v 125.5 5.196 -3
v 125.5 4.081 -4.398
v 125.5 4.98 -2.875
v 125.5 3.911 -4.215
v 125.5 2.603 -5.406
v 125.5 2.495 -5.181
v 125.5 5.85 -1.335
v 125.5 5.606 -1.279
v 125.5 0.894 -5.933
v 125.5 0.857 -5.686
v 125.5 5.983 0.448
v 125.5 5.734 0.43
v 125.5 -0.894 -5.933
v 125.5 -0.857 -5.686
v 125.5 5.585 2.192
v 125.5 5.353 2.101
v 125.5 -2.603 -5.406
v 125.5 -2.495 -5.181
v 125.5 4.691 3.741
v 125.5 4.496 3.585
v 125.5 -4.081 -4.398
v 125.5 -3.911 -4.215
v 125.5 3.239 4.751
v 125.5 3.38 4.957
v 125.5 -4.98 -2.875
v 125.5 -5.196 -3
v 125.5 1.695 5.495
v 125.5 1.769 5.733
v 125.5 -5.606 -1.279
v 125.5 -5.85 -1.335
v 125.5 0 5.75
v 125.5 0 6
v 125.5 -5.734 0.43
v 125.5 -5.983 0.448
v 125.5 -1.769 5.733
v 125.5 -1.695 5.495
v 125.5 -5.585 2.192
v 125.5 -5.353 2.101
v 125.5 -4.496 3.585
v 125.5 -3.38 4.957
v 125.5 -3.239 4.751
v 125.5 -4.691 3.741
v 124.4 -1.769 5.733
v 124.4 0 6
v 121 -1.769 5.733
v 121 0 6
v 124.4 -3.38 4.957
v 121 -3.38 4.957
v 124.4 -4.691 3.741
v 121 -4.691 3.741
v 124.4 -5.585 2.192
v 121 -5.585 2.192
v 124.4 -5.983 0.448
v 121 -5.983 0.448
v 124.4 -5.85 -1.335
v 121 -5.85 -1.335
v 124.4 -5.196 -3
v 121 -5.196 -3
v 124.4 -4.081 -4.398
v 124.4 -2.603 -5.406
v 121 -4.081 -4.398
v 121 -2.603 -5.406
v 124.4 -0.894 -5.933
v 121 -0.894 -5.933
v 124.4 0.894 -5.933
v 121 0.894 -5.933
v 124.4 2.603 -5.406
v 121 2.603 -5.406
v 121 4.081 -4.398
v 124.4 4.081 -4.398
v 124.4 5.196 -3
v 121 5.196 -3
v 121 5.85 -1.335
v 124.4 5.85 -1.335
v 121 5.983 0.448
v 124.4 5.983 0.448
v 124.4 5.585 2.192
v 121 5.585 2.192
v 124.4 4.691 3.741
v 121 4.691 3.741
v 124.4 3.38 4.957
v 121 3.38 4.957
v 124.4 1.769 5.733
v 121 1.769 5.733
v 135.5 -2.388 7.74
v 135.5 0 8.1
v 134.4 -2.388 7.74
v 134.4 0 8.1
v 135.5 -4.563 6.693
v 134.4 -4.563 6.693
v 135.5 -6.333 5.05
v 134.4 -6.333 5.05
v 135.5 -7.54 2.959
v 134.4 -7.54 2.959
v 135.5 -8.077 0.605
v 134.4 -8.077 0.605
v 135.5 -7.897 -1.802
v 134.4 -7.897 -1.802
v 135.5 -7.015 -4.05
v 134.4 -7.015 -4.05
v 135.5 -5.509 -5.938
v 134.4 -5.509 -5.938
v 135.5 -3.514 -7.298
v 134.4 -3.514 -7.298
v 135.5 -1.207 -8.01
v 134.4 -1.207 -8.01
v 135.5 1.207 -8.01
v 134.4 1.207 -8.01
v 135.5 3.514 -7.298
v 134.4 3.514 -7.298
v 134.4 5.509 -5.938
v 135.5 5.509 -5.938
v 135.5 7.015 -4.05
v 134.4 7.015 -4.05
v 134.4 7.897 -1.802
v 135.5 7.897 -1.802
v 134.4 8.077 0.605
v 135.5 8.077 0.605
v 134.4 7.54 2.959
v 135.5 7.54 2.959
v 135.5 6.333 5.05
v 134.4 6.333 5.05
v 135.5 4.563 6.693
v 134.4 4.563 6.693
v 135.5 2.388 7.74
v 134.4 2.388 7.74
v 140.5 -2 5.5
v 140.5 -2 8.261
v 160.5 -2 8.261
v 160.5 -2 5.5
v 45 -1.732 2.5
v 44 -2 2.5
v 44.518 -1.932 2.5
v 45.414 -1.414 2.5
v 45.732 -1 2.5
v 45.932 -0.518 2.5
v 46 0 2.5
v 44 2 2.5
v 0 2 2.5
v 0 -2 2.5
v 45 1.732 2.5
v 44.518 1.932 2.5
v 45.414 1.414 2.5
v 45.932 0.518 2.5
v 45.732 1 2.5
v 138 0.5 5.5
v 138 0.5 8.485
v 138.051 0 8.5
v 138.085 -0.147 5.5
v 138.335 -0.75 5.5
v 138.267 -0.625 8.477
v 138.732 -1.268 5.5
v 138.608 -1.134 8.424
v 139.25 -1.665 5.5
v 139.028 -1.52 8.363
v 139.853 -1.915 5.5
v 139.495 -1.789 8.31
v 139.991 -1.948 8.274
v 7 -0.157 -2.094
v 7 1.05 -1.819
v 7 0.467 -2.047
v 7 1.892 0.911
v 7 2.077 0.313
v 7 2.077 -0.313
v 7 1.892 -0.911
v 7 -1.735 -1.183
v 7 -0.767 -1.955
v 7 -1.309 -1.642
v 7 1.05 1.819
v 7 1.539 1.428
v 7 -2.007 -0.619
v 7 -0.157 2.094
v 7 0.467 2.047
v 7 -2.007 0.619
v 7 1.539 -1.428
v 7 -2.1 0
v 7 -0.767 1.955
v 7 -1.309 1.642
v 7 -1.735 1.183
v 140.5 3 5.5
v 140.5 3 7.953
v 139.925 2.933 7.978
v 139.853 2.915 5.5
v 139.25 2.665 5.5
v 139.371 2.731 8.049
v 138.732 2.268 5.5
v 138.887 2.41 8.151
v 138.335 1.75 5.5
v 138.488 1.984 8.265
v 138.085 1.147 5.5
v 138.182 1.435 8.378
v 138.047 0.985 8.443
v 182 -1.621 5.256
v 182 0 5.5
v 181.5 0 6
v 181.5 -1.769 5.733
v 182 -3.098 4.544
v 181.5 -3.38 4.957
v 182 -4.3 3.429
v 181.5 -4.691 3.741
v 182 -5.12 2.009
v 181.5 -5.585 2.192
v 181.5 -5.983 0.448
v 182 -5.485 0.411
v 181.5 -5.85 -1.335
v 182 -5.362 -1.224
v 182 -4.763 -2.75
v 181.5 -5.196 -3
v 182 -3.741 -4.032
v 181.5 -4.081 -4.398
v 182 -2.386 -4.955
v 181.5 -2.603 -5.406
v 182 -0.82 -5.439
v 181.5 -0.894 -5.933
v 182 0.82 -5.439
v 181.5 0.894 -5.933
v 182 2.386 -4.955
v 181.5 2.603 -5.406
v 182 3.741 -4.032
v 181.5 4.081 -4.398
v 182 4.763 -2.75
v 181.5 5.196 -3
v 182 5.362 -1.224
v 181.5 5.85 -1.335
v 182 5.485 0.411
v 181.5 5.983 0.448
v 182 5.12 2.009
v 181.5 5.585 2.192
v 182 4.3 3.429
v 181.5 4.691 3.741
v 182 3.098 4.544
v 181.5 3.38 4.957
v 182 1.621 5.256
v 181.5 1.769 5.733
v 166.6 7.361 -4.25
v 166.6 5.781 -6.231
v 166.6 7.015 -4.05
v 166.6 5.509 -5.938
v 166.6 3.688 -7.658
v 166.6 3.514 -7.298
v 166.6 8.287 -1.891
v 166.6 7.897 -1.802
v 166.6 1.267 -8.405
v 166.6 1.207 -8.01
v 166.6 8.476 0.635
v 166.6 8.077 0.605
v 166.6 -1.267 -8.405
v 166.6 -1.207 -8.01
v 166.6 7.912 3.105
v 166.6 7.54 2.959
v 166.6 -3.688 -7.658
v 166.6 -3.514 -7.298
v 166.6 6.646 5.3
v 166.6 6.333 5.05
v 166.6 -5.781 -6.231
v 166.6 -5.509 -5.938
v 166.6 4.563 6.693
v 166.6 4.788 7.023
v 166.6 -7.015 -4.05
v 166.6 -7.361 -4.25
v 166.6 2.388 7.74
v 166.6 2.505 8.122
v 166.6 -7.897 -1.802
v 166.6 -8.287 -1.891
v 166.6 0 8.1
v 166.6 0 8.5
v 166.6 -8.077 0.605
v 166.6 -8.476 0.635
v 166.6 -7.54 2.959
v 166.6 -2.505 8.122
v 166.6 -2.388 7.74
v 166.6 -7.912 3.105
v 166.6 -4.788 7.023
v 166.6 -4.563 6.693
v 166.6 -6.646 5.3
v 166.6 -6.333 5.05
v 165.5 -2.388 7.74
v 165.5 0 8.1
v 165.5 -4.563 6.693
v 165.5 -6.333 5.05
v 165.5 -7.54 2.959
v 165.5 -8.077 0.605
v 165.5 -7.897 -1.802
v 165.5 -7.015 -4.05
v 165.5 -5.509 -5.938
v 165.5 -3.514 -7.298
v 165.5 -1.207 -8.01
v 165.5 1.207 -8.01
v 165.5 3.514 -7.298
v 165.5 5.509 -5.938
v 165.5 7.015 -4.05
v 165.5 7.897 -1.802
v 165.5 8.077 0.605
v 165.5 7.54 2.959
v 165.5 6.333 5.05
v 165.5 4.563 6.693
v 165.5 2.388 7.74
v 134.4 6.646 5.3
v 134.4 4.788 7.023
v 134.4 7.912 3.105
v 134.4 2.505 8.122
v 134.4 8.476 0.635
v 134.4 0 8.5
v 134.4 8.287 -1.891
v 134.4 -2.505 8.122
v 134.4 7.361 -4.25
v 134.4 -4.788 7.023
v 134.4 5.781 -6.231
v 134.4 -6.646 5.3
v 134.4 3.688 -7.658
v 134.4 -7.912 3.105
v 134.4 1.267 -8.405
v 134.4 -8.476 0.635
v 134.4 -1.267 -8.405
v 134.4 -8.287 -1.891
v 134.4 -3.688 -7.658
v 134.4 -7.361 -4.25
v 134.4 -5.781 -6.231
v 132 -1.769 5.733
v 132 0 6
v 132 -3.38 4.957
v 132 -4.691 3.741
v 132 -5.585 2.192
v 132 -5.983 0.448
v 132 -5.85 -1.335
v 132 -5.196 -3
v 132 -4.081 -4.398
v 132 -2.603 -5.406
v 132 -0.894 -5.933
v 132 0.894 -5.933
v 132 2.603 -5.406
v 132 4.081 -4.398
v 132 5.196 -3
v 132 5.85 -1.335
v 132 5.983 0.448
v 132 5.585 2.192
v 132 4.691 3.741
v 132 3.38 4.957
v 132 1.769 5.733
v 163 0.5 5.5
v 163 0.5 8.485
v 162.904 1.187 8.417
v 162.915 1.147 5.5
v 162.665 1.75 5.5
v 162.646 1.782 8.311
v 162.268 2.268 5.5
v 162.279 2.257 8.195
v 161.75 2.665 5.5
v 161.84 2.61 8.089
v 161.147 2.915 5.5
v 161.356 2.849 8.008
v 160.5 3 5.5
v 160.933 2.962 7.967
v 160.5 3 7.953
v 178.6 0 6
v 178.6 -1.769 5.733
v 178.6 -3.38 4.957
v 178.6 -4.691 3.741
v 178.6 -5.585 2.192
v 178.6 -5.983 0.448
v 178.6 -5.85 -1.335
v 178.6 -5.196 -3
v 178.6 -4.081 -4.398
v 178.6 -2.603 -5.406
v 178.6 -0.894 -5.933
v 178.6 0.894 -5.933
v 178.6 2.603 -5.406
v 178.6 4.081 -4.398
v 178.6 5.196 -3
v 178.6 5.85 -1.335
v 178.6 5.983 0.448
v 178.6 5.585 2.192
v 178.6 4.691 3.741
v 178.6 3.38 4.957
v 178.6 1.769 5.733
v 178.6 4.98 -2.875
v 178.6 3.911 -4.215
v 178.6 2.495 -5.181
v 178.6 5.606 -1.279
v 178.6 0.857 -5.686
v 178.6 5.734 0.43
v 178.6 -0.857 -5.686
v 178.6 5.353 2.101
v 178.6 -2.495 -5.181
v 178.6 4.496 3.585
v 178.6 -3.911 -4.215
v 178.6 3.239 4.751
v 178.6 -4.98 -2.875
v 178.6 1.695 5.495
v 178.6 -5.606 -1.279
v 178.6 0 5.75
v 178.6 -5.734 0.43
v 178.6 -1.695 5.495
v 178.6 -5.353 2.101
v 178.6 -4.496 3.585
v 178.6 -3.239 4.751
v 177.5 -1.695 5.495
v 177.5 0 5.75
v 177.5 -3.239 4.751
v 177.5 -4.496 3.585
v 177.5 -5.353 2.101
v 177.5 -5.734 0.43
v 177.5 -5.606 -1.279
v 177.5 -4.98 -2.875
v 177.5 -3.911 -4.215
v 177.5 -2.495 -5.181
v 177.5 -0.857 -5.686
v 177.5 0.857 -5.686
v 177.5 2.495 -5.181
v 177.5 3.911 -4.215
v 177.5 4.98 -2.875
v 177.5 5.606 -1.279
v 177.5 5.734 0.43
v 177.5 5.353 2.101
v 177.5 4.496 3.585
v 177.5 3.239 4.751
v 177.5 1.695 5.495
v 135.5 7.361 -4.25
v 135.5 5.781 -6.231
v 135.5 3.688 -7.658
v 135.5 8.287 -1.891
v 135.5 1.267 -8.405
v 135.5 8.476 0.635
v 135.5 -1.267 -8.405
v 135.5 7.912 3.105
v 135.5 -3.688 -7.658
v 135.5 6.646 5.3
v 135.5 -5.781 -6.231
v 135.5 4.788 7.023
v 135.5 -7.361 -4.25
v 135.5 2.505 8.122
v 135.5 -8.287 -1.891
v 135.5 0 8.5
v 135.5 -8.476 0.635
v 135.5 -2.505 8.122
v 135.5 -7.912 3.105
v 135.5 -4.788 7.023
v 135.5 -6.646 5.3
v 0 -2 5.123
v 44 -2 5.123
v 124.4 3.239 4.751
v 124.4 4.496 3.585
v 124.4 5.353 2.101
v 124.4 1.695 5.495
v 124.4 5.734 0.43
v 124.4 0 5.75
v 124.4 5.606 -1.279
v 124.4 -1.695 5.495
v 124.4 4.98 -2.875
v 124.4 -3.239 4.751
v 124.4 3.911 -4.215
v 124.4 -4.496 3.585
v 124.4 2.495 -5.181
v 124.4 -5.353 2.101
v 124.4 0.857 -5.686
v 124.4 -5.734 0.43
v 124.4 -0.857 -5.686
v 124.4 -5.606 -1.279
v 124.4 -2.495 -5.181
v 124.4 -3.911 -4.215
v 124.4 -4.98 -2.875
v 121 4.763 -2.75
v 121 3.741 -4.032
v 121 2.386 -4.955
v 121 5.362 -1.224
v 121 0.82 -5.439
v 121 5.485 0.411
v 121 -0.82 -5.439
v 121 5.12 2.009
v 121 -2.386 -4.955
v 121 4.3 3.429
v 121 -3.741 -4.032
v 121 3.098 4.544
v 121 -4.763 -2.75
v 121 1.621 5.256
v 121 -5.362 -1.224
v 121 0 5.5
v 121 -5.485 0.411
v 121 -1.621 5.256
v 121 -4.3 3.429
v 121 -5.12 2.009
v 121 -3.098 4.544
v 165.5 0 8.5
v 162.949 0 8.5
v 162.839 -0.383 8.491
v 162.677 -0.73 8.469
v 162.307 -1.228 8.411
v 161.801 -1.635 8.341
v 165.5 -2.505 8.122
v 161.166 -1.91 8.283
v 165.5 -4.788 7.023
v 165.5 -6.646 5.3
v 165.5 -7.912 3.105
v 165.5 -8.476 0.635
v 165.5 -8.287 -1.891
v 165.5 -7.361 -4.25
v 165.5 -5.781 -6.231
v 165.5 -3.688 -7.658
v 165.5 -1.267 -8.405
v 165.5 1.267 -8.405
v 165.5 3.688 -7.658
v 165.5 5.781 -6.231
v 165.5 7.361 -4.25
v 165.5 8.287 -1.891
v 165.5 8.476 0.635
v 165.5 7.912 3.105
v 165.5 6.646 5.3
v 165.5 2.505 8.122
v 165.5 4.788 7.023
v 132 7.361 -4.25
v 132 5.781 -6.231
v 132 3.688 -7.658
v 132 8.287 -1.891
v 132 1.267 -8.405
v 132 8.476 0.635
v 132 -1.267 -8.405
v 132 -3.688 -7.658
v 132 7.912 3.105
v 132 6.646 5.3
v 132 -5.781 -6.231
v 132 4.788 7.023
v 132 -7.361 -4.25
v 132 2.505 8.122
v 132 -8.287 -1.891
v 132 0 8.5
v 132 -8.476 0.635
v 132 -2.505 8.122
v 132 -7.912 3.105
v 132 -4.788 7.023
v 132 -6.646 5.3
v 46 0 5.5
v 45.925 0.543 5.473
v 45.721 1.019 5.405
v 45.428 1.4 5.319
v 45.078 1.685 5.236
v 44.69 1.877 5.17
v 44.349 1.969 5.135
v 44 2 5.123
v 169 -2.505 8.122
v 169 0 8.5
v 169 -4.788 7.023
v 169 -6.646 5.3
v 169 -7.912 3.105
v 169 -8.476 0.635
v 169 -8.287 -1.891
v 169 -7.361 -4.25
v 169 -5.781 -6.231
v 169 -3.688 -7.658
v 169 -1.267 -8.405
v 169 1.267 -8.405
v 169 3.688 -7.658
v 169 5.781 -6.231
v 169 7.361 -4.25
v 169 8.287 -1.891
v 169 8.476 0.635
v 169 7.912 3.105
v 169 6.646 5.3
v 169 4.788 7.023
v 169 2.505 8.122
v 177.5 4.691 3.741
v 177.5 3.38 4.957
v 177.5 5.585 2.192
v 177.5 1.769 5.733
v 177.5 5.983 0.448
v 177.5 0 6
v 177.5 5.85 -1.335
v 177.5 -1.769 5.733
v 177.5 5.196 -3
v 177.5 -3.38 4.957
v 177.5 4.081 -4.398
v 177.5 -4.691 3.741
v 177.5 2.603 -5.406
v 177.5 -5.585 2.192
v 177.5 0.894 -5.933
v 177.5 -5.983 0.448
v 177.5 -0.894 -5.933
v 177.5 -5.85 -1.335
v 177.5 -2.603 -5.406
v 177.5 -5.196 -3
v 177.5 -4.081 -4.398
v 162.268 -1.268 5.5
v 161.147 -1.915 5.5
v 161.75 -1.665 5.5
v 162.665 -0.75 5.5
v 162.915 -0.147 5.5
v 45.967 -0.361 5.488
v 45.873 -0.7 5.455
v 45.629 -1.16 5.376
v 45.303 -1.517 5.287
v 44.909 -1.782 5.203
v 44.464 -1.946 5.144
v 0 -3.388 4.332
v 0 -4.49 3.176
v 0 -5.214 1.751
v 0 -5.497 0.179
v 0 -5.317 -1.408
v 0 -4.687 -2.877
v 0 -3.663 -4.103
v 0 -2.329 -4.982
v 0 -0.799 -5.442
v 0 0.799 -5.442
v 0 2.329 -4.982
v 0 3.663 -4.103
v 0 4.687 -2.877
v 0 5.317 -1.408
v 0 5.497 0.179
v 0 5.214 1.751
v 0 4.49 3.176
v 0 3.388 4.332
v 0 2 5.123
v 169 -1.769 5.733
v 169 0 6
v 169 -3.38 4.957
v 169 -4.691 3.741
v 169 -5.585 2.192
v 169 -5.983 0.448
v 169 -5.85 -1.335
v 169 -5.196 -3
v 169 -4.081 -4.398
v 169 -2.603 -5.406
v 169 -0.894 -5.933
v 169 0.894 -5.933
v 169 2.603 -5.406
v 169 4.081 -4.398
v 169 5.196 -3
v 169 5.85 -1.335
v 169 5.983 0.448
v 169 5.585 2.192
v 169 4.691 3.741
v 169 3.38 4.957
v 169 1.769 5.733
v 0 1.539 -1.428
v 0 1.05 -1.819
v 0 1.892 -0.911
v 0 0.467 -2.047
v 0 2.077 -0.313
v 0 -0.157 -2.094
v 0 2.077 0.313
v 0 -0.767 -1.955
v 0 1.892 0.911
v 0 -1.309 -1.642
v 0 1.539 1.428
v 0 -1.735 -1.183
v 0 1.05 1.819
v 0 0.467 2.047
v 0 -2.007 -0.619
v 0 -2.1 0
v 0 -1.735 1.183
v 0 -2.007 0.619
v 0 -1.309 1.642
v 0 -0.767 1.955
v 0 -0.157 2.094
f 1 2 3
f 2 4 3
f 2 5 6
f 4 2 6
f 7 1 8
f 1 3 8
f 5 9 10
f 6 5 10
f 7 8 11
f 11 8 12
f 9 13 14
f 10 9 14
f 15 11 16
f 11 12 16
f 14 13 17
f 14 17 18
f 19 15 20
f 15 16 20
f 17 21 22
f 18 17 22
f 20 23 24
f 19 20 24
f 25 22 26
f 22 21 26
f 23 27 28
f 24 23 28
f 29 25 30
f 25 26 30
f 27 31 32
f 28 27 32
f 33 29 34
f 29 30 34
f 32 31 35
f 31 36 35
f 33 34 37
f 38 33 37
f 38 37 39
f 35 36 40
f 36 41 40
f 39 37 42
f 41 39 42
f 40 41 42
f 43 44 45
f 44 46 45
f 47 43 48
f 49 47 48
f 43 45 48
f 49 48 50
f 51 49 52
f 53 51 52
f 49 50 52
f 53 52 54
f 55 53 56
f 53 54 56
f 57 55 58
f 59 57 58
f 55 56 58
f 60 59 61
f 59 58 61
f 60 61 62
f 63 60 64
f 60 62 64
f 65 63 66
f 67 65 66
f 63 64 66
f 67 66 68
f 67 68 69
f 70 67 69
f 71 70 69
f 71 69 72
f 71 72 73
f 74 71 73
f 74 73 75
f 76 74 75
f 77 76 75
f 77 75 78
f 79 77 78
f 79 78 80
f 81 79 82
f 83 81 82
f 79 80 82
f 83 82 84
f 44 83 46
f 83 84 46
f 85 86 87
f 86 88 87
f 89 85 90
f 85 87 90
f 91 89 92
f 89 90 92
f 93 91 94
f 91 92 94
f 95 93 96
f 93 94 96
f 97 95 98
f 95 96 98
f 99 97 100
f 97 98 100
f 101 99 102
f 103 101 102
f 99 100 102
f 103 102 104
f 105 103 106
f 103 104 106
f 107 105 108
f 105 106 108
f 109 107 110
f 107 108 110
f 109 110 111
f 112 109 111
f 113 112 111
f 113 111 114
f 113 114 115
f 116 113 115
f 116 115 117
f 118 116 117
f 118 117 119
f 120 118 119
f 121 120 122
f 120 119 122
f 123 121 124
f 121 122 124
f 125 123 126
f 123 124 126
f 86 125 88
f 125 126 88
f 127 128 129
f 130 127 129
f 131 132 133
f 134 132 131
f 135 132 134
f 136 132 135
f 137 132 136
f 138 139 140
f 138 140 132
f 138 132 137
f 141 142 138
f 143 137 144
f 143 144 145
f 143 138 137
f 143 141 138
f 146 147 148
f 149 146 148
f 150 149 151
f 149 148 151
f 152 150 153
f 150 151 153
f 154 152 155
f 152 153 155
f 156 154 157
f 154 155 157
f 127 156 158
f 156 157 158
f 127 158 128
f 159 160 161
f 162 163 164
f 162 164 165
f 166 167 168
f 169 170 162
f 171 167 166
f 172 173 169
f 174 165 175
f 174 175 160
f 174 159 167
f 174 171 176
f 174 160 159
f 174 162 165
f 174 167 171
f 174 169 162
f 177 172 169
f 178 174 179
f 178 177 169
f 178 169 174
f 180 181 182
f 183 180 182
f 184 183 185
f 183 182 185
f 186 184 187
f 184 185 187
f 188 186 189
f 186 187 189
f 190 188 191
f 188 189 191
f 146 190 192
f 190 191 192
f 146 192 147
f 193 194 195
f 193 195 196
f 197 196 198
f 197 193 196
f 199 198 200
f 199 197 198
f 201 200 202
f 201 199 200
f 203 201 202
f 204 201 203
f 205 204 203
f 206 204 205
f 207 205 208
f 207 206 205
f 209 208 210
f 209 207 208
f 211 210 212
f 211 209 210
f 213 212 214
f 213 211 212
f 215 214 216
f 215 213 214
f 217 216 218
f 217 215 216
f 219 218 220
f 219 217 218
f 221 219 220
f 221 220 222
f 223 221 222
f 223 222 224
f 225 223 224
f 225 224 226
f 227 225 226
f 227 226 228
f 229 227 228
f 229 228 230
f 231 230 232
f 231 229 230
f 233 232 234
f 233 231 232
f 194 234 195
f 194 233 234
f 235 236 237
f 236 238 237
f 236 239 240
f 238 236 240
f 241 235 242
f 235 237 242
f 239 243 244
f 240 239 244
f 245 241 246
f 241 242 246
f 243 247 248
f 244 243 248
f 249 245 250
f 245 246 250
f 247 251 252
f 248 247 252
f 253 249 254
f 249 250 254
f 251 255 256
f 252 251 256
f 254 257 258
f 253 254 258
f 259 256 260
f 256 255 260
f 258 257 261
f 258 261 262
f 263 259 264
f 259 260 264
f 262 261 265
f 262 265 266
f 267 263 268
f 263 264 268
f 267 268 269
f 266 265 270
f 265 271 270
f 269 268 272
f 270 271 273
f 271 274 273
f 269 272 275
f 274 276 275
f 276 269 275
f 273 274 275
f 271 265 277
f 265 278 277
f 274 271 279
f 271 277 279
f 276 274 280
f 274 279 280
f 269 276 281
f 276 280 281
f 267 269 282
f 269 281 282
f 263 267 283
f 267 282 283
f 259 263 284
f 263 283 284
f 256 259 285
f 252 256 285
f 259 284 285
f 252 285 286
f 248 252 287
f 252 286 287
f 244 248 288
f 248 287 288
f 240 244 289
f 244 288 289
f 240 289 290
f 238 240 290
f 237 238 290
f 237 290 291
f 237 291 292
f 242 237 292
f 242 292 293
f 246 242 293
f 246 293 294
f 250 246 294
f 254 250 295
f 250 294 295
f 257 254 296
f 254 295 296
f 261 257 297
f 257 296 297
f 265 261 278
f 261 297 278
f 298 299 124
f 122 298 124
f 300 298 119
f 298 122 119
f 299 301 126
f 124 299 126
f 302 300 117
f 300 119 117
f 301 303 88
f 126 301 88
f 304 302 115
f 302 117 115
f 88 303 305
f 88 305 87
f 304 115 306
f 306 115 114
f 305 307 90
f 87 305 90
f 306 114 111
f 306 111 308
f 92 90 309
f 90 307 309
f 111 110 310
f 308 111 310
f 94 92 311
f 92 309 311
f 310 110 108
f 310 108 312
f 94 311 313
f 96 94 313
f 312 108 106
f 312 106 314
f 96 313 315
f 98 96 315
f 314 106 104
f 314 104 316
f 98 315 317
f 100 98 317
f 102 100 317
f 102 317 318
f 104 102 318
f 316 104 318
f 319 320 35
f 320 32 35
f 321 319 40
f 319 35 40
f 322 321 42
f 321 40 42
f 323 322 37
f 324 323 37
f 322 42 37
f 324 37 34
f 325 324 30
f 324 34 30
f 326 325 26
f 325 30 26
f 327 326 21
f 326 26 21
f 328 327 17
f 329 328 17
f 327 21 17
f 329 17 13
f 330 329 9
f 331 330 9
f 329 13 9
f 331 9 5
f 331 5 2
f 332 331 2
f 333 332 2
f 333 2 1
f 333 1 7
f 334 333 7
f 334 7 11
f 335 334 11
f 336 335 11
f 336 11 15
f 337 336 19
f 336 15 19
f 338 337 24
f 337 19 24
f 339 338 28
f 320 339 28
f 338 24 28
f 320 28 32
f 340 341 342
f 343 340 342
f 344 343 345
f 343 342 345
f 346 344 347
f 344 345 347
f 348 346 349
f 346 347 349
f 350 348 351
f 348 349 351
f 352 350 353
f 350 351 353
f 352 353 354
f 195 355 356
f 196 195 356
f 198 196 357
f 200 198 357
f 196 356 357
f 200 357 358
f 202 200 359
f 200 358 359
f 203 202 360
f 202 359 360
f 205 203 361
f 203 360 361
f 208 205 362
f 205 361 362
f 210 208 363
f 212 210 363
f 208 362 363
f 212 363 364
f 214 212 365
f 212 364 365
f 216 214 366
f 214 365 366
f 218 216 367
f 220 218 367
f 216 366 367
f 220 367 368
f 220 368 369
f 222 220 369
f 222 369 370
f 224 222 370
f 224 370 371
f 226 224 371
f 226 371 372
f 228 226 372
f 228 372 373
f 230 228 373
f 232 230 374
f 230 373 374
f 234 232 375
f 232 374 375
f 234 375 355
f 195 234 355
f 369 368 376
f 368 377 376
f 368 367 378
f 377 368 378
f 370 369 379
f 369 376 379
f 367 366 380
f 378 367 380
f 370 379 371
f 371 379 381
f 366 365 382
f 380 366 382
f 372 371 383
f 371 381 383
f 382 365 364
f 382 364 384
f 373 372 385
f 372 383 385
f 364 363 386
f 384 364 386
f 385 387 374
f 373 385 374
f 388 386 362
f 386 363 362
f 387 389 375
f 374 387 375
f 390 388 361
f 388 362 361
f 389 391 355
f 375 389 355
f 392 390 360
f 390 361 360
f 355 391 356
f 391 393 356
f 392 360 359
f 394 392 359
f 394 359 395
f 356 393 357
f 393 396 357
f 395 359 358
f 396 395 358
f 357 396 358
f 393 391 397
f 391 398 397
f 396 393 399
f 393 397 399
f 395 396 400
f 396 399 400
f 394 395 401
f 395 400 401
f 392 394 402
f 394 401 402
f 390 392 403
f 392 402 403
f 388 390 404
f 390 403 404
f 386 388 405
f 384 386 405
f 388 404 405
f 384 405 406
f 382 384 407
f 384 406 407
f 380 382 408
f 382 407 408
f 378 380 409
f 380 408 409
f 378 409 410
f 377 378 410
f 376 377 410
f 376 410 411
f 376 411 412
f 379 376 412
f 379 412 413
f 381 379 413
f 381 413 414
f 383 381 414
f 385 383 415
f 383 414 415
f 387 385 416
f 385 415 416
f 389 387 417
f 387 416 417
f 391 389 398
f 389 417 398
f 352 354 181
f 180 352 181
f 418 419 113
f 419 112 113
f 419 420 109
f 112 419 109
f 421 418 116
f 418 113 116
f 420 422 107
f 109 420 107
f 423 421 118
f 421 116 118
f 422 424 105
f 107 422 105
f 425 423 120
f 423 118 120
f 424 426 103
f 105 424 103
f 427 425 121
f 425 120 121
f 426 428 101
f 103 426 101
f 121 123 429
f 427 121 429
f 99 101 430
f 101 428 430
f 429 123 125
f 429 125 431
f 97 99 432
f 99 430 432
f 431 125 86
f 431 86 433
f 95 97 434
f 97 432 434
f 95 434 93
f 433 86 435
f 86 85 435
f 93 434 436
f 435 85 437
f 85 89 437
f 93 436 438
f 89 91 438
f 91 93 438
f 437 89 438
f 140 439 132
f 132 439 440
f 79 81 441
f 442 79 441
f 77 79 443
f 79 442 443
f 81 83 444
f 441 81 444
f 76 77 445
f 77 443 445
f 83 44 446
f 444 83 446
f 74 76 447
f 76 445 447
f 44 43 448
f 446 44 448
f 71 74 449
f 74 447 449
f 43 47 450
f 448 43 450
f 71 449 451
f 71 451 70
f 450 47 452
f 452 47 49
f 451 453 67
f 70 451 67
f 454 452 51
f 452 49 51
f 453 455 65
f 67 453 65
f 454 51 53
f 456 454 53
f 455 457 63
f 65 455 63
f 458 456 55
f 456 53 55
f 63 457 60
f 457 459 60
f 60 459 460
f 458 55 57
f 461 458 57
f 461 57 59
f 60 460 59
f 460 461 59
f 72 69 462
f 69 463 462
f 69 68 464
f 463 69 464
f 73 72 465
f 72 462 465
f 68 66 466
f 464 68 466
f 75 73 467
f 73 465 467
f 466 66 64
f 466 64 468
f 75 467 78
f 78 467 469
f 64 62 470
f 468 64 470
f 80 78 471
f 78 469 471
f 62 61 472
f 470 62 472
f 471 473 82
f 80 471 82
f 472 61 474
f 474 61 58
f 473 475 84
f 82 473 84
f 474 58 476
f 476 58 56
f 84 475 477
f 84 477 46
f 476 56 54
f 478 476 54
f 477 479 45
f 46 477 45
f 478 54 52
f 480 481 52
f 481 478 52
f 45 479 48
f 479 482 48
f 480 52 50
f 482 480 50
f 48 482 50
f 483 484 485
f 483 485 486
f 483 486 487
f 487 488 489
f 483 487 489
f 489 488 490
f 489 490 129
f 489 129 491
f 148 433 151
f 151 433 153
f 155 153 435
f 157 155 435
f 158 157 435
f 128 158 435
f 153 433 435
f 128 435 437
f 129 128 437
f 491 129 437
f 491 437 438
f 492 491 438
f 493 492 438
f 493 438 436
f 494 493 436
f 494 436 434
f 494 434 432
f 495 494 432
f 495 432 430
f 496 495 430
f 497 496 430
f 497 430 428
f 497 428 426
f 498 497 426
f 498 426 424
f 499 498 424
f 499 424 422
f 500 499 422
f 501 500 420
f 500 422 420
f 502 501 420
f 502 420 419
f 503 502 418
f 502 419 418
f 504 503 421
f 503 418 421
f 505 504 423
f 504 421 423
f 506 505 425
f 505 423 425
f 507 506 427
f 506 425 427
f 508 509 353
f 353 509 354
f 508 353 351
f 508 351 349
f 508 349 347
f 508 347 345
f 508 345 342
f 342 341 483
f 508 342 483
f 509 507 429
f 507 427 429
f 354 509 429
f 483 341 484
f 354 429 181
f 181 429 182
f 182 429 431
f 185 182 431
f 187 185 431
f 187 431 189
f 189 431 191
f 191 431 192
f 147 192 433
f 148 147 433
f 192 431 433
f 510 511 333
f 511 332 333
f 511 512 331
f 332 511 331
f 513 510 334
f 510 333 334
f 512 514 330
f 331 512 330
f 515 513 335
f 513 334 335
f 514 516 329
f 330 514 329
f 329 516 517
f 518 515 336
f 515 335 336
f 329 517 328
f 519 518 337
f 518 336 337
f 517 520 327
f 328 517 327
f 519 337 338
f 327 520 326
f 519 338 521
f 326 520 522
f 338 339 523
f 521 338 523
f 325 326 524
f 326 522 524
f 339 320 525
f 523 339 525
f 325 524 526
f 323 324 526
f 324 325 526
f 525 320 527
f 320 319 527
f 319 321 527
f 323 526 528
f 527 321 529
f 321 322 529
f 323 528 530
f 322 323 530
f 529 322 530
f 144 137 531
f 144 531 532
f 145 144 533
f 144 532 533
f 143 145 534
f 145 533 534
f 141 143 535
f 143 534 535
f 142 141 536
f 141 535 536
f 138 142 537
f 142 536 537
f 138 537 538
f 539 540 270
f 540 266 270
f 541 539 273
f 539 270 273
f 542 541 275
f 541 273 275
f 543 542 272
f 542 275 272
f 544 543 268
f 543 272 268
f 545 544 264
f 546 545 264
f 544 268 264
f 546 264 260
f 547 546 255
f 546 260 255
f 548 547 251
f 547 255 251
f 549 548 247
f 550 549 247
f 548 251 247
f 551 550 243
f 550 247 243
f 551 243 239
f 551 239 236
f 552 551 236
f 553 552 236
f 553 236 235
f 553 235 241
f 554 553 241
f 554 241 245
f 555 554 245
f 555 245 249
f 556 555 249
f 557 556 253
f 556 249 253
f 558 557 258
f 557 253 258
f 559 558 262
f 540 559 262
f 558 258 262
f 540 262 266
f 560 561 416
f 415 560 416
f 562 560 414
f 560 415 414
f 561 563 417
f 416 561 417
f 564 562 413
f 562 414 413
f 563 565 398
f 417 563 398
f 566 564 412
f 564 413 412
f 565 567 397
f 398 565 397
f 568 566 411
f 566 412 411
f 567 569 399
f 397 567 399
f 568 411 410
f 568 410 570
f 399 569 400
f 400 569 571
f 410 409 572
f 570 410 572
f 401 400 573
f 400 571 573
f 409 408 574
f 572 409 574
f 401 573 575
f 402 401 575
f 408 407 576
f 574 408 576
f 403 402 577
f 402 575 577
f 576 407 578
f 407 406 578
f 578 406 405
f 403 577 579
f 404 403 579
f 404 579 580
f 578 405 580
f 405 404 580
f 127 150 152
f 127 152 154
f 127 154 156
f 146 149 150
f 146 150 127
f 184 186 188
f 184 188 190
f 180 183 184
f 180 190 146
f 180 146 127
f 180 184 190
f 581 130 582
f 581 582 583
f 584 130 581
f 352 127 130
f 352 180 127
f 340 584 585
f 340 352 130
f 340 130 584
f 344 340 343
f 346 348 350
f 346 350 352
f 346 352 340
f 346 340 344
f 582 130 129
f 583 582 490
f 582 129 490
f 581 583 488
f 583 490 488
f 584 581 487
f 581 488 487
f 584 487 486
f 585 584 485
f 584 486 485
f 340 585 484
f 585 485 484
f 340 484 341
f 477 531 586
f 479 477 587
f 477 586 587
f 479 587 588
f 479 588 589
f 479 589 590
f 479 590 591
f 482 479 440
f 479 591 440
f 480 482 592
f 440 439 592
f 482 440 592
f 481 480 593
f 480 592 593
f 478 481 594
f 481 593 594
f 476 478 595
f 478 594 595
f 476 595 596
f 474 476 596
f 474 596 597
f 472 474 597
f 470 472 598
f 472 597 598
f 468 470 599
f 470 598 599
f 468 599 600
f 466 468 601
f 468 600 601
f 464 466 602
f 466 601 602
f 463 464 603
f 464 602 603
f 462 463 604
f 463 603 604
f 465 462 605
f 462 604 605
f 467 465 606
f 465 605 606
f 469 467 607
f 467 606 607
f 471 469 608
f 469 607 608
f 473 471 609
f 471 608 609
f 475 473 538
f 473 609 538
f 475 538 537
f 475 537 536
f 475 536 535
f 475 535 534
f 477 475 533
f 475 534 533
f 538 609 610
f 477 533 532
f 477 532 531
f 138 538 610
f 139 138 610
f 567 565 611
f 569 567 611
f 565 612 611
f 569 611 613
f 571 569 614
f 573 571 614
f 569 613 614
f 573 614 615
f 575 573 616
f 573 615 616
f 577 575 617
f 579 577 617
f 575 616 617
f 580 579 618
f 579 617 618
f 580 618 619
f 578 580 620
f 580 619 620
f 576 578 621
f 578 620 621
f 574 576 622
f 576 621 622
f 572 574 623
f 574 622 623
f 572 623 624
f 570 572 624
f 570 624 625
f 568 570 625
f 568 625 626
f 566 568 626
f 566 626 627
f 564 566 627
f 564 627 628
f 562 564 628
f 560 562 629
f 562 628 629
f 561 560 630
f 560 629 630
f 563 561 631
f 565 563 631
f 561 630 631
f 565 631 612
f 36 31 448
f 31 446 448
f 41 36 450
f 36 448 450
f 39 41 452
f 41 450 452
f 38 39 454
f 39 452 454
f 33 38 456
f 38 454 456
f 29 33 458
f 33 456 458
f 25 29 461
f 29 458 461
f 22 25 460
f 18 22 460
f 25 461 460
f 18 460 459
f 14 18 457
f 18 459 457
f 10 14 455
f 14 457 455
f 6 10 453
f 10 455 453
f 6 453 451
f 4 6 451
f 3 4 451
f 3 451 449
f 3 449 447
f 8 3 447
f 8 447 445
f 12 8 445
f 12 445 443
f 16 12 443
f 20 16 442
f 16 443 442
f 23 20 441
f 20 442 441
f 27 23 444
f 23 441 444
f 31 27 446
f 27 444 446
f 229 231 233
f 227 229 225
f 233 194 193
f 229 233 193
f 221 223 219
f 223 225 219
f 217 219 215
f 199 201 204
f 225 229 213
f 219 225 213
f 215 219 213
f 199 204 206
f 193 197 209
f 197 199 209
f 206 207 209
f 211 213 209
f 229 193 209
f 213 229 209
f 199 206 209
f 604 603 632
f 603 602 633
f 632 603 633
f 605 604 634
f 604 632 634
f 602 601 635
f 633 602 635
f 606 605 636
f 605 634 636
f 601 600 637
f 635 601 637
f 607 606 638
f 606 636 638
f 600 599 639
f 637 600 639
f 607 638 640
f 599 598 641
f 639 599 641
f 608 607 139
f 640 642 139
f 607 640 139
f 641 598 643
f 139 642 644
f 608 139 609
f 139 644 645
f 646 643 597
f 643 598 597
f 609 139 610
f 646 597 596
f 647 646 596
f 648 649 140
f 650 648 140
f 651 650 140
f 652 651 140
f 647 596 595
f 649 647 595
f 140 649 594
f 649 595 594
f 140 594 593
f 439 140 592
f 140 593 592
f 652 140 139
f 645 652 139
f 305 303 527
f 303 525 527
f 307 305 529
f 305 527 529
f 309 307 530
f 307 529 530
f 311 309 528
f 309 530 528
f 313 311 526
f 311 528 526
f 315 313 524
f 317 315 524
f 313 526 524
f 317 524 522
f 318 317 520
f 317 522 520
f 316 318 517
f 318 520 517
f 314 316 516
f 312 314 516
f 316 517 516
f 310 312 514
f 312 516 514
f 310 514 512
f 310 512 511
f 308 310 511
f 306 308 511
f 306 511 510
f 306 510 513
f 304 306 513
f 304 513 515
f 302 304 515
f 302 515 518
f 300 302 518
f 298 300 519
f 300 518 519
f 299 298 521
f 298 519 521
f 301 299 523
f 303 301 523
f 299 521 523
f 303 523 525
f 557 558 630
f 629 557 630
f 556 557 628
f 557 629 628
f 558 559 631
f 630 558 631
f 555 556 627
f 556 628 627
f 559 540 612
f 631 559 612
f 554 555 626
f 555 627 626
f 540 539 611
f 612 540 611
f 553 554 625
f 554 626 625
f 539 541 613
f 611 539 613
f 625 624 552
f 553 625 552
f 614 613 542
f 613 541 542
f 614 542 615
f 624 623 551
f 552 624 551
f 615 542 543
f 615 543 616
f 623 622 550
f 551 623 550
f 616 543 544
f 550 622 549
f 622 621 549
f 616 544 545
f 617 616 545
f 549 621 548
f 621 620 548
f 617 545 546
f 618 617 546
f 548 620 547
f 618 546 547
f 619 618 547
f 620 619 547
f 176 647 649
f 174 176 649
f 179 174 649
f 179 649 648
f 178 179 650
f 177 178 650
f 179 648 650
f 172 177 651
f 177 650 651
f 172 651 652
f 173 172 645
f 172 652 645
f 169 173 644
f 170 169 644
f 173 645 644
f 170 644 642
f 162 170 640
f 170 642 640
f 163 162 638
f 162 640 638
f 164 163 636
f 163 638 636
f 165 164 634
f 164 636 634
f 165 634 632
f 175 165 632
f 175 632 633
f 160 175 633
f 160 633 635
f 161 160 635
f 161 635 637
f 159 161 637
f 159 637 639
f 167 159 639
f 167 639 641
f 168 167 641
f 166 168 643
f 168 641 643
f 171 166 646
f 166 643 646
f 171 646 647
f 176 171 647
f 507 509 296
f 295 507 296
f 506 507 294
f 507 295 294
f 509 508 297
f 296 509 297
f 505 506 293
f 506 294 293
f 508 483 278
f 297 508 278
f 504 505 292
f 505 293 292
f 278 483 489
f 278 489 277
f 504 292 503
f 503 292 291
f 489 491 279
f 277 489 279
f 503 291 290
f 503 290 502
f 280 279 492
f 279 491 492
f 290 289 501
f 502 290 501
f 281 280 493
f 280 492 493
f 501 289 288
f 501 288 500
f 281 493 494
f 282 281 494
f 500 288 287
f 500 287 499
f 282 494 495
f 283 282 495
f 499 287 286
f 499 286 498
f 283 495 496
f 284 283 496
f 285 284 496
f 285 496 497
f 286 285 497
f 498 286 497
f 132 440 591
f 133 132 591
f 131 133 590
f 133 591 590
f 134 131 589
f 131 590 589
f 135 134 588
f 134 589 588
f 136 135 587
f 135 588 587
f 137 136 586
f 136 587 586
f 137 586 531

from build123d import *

# Parameters (mm, degrees)
F4_DEPTH = 3
F7_DEPTH = 3
F8_R     = 2.1
F9_DEPTH = 7
F10_SIZE = 0.5


with BuildPart() as f1:
    # F0 (on Front) → F1 (revolve)
    with BuildSketch(Plane.XZ):
        Polygon((0, 5.5), (0, 0), (182, 0), (182, 6), (178.6, 6), (178.6, 5.75), (177.5, 5.75), (177.5, 6), (169, 6), (169, 8.5), (166.6, 8.5), (166.6, 8.1), (165.5, 8.1), (165.5, 8.5), (135.5, 8.5), (135.5, 8.1), (134.4, 8.1), (134.4, 8.5), (132, 8.5), (132, 6), (125.5, 6), (125.5, 5.75), (124.4, 5.75), (124.4, 6), (121, 6), (121, 5.5), align=None)
    revolve(axis=Axis((91, 0, 0), (1, 0, 0)))

    # F3 (on offset) → F4 (cut)
    with BuildSketch(Plane.XY.offset(5.5)):
        with BuildLine():
            Line((0, 2), (0, -2))
            Line((0, -2), (44, -2))
            ThreePointArc((44, -2), (45.414214, -1.414214), (46, 0))
            ThreePointArc((46, 0), (45.414214, 1.414214), (44, 2))
            Line((44, 2), (0, 2))
        make_face()
    extrude(amount=-F4_DEPTH, mode=Mode.SUBTRACT)

    # F6 (on offset) → F7 (cut)
    with BuildSketch(Plane.XY.offset(8.5)):
        with BuildLine():
            ThreePointArc((138, 0.5), (138.732233, -1.267767), (140.5, -2))
            Line((140.5, -2), (160.5, -2))
            ThreePointArc((160.5, -2), (162.267767, -1.267767), (163, 0.5))
            ThreePointArc((163, 0.5), (162.267767, 2.267767), (160.5, 3))
            Line((160.5, 3), (140.5, 3))
            ThreePointArc((140.5, 3), (138.732233, 2.267767), (138, 0.5))
        make_face()
    extrude(amount=-F7_DEPTH, mode=Mode.SUBTRACT)

    # F8 (on face) → F9 (cut)
    with BuildSketch(Plane(origin=(0, 0, 0), x_dir=(0, -1, 0), z_dir=(-1, 0, 0))):
        Circle(F8_R)
    extrude(amount=-F9_DEPTH, mode=Mode.SUBTRACT)

    # F10
    f10_edges = [f1.edges().sort_by_distance(p)[0] for p in [
        (182, 0, -6),
    ]]
    chamfer(f10_edges, length=F10_SIZE)


solid = f1.part
